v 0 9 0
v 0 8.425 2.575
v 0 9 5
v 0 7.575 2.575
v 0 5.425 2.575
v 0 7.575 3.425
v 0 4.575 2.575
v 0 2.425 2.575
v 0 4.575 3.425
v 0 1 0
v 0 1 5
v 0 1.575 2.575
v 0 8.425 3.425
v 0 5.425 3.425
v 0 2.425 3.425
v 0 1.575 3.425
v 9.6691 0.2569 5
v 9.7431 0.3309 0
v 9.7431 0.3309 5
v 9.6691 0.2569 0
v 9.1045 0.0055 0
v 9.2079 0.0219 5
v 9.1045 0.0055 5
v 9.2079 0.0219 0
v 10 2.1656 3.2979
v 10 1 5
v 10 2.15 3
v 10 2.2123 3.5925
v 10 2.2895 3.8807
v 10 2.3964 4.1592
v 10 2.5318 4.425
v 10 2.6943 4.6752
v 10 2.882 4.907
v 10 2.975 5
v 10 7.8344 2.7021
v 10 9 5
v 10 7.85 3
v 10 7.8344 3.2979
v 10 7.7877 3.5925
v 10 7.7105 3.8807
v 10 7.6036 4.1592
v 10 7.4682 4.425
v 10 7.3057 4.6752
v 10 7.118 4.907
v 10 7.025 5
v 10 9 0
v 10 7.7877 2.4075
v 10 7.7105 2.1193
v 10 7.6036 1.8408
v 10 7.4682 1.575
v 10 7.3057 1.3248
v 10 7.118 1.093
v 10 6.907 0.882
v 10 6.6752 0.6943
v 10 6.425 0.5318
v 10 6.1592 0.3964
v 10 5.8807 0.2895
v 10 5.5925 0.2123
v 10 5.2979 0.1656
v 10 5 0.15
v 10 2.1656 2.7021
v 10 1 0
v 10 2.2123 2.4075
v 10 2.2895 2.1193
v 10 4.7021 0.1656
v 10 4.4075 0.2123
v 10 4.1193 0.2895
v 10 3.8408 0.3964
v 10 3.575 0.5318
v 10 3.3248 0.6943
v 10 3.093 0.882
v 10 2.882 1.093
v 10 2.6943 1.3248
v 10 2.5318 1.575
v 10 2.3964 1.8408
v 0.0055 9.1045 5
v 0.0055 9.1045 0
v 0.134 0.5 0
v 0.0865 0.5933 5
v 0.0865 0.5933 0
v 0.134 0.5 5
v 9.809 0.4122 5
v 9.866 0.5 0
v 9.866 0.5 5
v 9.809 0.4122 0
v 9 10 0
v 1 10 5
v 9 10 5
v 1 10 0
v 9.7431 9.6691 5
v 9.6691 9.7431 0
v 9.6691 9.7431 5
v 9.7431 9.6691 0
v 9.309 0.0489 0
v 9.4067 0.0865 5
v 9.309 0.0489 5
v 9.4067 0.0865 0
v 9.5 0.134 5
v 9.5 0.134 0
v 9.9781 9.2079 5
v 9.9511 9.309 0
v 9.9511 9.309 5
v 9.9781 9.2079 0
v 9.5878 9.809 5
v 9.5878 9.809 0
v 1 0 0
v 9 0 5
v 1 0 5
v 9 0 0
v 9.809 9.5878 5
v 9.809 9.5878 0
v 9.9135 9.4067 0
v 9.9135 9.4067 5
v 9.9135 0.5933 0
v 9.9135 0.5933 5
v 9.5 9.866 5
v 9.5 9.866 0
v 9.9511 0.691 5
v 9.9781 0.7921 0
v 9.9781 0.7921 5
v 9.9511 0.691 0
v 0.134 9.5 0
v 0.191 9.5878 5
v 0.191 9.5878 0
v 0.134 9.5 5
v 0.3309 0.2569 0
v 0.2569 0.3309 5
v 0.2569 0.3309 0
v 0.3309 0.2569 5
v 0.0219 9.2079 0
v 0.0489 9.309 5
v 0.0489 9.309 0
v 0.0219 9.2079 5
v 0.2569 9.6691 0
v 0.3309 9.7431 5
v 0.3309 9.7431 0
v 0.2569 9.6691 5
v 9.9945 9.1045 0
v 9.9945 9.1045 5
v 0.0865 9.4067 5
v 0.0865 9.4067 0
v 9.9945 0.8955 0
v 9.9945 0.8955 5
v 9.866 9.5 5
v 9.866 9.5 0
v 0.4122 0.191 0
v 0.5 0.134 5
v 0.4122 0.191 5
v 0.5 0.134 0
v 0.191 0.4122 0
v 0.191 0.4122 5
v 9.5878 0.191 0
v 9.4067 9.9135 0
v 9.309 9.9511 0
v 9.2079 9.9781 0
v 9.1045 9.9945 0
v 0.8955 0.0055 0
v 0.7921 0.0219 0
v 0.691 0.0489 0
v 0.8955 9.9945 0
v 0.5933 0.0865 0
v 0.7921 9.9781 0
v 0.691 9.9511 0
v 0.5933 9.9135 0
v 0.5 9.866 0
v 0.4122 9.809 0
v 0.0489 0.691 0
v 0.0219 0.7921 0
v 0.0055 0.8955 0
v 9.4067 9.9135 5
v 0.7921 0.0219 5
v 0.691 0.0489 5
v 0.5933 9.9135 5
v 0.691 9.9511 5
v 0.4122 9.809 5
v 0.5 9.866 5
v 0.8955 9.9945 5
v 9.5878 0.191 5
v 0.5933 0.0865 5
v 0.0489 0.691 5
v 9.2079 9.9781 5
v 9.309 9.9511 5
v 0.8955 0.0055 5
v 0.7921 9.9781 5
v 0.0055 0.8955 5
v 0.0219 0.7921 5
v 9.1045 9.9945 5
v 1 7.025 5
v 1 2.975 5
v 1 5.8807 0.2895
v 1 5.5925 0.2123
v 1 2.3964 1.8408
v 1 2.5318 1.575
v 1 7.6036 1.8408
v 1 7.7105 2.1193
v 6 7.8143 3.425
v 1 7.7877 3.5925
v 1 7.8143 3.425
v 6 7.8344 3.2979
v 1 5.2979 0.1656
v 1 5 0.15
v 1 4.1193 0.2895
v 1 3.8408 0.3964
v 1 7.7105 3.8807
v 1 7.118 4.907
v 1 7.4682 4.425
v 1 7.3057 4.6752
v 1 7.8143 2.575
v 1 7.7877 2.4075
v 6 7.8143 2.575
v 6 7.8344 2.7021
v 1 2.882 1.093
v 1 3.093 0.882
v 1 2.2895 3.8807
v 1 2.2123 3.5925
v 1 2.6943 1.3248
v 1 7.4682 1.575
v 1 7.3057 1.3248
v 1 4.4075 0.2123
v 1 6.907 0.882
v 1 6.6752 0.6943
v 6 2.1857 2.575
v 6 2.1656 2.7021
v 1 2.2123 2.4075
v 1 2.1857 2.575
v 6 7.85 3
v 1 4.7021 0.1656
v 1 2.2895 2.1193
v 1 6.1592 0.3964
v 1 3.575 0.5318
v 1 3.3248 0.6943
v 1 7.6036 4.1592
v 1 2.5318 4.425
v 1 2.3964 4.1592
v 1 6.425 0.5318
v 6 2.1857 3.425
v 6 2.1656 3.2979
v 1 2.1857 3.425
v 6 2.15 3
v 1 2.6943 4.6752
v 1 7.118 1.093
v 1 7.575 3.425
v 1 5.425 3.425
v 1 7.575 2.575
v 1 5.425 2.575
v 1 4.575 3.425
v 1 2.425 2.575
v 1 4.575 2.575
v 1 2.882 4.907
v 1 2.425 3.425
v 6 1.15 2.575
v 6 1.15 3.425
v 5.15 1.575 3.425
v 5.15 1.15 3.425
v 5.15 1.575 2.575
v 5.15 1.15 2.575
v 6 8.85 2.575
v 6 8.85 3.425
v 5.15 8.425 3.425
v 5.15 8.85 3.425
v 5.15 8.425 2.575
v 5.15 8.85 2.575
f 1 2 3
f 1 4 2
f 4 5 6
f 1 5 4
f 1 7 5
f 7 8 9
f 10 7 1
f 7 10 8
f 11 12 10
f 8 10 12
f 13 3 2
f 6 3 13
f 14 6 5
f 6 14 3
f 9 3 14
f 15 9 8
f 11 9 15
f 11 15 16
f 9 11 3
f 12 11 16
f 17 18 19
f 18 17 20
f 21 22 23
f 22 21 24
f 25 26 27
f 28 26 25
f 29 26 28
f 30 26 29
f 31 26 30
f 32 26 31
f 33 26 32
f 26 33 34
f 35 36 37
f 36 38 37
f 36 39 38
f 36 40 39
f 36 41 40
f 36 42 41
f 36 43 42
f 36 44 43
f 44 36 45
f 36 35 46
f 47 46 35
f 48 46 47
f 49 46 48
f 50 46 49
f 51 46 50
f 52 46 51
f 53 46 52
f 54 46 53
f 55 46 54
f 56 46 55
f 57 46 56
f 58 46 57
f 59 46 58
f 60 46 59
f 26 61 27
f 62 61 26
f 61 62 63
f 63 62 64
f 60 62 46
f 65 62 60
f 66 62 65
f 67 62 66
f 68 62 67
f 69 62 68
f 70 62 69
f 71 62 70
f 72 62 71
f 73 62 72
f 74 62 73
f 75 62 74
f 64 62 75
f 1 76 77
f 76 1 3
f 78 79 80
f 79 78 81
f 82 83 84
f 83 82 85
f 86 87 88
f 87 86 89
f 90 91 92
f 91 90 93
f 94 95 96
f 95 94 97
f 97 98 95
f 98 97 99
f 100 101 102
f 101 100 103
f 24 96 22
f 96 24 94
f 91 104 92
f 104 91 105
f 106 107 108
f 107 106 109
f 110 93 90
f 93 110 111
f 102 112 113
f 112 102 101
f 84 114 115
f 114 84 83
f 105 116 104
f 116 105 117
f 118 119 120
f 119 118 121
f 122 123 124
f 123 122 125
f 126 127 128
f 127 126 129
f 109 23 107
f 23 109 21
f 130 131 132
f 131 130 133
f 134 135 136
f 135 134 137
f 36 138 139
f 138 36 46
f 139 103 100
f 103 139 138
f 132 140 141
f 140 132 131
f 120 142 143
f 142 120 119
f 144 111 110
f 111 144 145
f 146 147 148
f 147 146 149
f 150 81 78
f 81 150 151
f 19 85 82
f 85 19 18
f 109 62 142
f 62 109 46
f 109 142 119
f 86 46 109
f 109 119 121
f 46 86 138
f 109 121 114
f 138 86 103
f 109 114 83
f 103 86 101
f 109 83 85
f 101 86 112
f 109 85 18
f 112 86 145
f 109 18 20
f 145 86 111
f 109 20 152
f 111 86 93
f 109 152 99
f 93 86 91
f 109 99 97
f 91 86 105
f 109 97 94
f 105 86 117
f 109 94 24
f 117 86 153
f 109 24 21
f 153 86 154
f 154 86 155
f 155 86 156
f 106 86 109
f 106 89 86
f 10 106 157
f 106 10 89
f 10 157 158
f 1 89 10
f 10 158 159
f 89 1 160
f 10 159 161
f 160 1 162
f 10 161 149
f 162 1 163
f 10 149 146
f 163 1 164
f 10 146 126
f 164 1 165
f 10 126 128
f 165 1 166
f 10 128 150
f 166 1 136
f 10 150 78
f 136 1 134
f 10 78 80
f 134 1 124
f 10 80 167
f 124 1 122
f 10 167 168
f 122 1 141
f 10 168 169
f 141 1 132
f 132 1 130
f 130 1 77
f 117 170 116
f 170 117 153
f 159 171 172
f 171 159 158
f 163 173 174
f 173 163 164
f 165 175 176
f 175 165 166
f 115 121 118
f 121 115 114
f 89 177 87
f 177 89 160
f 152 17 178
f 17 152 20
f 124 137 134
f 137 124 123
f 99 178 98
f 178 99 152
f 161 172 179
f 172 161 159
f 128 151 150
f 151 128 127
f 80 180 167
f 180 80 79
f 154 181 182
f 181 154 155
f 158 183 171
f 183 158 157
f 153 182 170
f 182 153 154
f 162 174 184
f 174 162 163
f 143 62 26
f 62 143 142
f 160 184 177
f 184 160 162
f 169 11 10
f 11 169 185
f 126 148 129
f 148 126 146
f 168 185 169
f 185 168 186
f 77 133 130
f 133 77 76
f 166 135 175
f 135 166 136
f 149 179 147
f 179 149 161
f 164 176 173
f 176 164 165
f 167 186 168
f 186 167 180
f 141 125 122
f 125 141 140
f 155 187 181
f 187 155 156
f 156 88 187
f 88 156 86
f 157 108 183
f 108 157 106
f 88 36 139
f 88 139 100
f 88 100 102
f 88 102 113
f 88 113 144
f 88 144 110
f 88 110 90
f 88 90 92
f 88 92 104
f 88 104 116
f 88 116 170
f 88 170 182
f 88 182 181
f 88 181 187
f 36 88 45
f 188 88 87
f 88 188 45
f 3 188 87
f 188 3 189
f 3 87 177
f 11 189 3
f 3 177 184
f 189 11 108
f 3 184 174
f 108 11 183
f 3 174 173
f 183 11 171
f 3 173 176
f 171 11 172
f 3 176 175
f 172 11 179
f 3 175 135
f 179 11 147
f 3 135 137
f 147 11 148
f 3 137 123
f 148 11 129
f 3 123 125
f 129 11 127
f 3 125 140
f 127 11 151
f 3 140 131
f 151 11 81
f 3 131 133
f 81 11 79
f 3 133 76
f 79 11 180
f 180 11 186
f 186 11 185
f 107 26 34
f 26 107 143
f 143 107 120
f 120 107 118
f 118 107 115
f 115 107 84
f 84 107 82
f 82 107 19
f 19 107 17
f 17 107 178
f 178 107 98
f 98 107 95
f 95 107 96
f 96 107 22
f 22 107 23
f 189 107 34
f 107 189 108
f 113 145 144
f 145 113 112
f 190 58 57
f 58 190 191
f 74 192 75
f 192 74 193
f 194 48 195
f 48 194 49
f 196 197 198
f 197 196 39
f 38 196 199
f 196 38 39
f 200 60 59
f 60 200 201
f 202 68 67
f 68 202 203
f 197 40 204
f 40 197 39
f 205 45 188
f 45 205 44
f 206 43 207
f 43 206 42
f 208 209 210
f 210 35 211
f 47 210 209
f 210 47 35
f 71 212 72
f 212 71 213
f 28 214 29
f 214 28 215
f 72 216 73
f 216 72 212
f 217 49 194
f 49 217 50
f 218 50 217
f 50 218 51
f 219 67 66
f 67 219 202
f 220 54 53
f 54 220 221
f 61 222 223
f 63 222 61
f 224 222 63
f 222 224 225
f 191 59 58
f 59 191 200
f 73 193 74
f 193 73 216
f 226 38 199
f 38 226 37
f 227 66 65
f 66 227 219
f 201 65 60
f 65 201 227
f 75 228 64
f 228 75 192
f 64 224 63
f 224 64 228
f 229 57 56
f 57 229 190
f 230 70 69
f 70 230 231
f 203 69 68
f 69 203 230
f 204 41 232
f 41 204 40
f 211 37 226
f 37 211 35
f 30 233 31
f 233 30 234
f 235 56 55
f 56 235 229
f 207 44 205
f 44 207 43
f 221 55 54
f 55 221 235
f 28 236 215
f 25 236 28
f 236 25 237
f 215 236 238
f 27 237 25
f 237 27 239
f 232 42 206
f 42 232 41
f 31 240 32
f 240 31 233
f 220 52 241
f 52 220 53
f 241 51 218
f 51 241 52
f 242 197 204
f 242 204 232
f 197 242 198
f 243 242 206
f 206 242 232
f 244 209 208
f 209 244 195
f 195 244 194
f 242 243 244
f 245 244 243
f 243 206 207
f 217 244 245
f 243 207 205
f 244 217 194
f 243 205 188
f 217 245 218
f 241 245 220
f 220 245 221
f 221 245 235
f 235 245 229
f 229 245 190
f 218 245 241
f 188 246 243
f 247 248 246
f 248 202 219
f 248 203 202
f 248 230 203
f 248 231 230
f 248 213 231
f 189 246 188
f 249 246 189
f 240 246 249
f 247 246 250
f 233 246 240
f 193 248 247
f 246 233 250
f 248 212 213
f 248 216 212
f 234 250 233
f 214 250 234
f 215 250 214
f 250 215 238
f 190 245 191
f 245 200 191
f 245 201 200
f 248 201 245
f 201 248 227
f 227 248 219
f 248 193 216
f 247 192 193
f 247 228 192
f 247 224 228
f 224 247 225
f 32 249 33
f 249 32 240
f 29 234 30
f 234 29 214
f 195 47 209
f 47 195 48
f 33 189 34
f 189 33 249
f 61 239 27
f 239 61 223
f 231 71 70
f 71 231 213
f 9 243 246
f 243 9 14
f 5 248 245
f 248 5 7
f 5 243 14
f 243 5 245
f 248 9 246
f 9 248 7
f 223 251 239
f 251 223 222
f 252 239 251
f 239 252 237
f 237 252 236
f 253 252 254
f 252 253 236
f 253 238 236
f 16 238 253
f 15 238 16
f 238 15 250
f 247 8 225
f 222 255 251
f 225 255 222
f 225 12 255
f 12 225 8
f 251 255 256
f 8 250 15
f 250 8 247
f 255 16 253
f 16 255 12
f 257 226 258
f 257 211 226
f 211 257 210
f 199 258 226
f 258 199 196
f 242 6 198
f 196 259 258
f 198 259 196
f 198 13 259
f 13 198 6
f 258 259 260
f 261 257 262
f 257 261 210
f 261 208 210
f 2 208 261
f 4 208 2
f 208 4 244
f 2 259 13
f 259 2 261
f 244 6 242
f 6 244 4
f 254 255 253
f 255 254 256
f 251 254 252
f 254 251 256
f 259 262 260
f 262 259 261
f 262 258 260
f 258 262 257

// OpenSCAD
$fn=60;

tolerance = 0.1;

jack();

module jack() {
    
    l = 10;
    pinL = 6;
    pinS = 0.65 +2*tolerance;
    
    difference(){
        translate([1,1,0]) minkowski(){
            cube([l-2, 8, 4]);
            cylinder(r=1,h=1);
        }
        translate([1,5,3]) rotate([0,90,0]) cylinder(r=5.5/2+tolerance, h=9);
        translate([0,5,3]) cube([2*pinL,pinS,pinS], true);
        translate([0,5-6/2,3]) cube([2*pinL,pinS,pinS], true);
        translate([0,5+6/2,3]) cube([2*pinL,pinS,pinS], true);
        translate([pinL-pinS/2,5-6/2-pinS/2,3]) cube([pinS,pinS,pinS], true);
        translate([pinL-pinS/2,5+6/2+pinS/2,3]) cube([pinS,pinS,pinS], true);
    }
}
